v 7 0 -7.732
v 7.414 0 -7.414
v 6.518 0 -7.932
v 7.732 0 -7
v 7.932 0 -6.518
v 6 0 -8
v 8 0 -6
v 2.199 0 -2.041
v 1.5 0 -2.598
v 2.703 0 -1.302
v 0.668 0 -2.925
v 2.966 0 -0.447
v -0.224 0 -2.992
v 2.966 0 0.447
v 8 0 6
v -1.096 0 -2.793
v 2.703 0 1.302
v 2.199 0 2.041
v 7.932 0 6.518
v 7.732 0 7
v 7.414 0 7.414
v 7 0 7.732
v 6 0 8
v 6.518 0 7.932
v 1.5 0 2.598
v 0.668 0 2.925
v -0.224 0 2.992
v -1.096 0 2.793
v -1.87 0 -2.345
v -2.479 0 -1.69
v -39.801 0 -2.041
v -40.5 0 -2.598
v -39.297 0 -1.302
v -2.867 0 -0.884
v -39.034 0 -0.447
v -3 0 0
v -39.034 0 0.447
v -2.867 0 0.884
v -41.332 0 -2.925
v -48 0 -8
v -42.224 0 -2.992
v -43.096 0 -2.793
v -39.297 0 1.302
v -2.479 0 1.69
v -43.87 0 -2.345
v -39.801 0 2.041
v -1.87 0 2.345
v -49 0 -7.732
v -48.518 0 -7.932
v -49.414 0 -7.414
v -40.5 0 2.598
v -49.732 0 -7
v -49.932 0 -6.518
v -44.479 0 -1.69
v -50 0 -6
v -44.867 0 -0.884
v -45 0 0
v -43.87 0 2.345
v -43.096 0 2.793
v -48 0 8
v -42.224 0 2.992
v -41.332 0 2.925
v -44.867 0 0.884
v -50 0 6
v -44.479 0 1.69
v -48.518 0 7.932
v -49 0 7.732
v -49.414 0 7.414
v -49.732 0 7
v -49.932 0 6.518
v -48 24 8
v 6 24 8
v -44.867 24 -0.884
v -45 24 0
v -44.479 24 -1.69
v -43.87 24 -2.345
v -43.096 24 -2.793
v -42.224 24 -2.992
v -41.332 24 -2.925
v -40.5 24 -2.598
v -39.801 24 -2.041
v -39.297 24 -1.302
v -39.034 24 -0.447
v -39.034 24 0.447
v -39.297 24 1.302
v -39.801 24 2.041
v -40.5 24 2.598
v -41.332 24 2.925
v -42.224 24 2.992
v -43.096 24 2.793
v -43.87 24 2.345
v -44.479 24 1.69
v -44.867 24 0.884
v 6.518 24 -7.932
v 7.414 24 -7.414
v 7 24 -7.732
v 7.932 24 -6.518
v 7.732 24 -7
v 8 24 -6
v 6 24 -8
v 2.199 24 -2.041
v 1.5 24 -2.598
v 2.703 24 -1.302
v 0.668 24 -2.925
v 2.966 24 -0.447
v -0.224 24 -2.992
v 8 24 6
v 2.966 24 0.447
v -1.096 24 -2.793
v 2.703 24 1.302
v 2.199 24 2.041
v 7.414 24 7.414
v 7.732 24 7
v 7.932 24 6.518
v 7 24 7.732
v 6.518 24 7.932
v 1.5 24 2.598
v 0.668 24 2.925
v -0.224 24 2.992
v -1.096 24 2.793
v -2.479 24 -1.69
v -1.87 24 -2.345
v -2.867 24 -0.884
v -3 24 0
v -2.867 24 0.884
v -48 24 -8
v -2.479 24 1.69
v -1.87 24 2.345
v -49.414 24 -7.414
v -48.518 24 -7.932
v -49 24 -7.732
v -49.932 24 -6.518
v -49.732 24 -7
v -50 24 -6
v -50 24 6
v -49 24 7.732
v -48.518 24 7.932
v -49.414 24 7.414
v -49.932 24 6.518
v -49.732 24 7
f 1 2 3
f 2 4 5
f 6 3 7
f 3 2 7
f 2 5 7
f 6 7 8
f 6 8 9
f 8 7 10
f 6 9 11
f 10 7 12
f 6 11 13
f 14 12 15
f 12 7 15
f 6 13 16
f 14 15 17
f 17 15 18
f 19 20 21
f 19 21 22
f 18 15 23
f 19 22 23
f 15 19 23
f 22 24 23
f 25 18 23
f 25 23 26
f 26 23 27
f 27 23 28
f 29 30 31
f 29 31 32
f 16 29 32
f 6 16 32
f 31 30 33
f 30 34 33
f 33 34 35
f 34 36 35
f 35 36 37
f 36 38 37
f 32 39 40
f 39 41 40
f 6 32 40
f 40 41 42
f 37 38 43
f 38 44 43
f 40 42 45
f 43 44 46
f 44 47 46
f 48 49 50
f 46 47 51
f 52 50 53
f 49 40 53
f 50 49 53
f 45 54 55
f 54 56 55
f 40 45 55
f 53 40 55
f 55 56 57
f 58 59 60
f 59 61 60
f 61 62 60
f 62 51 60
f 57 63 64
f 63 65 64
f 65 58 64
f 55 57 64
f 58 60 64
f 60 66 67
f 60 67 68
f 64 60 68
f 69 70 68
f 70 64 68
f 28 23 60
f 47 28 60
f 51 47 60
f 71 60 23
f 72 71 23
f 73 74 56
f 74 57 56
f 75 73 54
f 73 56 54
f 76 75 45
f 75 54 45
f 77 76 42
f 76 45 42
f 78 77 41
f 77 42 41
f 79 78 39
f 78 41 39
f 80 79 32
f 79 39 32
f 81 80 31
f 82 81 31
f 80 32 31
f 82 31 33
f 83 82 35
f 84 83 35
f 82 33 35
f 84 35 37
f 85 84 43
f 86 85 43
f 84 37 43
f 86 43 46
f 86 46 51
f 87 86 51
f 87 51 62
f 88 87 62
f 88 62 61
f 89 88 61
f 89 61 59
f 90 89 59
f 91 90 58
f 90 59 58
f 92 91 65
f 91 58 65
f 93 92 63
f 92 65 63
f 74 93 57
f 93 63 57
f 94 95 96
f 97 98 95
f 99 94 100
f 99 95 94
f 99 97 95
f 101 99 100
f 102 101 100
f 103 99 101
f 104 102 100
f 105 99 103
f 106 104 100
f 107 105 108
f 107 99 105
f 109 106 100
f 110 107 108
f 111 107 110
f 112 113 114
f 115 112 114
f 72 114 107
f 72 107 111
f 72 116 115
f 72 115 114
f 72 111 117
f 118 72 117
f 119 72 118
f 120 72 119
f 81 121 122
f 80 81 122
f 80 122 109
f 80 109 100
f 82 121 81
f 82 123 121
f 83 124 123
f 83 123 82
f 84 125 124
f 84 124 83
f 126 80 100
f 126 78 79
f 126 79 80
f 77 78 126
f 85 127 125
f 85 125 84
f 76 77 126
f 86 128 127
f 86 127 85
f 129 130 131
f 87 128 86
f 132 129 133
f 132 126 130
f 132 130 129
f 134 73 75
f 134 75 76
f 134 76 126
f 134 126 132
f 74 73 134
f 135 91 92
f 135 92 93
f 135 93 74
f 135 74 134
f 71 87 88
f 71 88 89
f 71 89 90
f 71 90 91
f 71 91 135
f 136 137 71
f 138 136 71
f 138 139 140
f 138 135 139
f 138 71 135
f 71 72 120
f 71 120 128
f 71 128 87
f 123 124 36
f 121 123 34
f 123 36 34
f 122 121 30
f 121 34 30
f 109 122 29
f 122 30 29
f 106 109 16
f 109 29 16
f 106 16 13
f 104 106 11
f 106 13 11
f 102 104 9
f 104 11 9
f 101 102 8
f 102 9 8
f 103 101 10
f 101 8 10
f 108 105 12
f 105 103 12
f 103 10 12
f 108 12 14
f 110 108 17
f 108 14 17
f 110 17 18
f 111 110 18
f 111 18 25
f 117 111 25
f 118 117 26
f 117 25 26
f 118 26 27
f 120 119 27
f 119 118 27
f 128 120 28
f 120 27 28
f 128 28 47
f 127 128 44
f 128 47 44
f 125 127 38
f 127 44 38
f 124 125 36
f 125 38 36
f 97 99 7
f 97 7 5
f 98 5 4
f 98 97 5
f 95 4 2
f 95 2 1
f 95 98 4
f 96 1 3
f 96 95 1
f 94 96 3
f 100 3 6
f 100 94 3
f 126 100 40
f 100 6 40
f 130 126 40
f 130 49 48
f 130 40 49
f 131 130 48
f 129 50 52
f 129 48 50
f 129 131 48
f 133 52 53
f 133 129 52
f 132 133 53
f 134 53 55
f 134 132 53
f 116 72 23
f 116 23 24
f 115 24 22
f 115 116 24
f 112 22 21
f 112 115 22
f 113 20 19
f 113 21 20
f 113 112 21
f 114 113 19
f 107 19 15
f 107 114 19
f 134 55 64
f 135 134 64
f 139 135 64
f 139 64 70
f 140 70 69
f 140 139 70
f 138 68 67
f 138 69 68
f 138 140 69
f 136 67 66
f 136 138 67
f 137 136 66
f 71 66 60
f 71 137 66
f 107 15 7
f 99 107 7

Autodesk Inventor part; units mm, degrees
ref_plane "YZ Plane" through (0, 0, 0) normal (1, 0, 0) x (0, 1, 0)
ref_plane "XZ Plane" through (0, 0, 0) normal (0, 1, 0) x (-1, 0, 0)
ref_plane "XY Plane" through (0, 0, 0) normal (0, 0, 1) x (1, 0, 0)
sketch "Sketch1" plane through (0, 0, 0) normal (0, 1, 0) x (-1, 0, 0)
  line L0 (0, 0) -> (42, 0)
  circle A0 centre (42, 0) radius 3
  circle A1 centre (0, 0) radius 3
  line L1 (0, 0) -> (-8, 0)
  line L2 (-8, 0) -> (-8, -8)
  line L3 (42, 0) -> (42, 8)
  line L4 (42, 8) -> (50, 8)
  line L5 (50, 8) -> (-8, 8)
  line L6 (-8, 8) -> (-8, -8)
  line L7 (-8, -8) -> (50, -8)
  line L8 (50, -8) -> (50, 8)
  dimension "d0" = 42
  dimension "d1" = 6
  dimension "d2" = 6
  dimension "d3" = 8
  dimension "d4" = 8
  dimension "d5" = 8
  dimension "d6" = 8
extrude "Extrusion1" add sketch "Sketch1" along normal blind 24 contours A1 L1 L6 L5 L3 A0 L0 | L0 A0 L3 L4 L8 L7 L2 L1 A1
fillet "Fillet1" radius 2 4 edges at (8, 12, 8) (8, 12, -8) (-50, 12, 8) (-50, 12, -8)
properties part number "Bearing Seat 8mm"
